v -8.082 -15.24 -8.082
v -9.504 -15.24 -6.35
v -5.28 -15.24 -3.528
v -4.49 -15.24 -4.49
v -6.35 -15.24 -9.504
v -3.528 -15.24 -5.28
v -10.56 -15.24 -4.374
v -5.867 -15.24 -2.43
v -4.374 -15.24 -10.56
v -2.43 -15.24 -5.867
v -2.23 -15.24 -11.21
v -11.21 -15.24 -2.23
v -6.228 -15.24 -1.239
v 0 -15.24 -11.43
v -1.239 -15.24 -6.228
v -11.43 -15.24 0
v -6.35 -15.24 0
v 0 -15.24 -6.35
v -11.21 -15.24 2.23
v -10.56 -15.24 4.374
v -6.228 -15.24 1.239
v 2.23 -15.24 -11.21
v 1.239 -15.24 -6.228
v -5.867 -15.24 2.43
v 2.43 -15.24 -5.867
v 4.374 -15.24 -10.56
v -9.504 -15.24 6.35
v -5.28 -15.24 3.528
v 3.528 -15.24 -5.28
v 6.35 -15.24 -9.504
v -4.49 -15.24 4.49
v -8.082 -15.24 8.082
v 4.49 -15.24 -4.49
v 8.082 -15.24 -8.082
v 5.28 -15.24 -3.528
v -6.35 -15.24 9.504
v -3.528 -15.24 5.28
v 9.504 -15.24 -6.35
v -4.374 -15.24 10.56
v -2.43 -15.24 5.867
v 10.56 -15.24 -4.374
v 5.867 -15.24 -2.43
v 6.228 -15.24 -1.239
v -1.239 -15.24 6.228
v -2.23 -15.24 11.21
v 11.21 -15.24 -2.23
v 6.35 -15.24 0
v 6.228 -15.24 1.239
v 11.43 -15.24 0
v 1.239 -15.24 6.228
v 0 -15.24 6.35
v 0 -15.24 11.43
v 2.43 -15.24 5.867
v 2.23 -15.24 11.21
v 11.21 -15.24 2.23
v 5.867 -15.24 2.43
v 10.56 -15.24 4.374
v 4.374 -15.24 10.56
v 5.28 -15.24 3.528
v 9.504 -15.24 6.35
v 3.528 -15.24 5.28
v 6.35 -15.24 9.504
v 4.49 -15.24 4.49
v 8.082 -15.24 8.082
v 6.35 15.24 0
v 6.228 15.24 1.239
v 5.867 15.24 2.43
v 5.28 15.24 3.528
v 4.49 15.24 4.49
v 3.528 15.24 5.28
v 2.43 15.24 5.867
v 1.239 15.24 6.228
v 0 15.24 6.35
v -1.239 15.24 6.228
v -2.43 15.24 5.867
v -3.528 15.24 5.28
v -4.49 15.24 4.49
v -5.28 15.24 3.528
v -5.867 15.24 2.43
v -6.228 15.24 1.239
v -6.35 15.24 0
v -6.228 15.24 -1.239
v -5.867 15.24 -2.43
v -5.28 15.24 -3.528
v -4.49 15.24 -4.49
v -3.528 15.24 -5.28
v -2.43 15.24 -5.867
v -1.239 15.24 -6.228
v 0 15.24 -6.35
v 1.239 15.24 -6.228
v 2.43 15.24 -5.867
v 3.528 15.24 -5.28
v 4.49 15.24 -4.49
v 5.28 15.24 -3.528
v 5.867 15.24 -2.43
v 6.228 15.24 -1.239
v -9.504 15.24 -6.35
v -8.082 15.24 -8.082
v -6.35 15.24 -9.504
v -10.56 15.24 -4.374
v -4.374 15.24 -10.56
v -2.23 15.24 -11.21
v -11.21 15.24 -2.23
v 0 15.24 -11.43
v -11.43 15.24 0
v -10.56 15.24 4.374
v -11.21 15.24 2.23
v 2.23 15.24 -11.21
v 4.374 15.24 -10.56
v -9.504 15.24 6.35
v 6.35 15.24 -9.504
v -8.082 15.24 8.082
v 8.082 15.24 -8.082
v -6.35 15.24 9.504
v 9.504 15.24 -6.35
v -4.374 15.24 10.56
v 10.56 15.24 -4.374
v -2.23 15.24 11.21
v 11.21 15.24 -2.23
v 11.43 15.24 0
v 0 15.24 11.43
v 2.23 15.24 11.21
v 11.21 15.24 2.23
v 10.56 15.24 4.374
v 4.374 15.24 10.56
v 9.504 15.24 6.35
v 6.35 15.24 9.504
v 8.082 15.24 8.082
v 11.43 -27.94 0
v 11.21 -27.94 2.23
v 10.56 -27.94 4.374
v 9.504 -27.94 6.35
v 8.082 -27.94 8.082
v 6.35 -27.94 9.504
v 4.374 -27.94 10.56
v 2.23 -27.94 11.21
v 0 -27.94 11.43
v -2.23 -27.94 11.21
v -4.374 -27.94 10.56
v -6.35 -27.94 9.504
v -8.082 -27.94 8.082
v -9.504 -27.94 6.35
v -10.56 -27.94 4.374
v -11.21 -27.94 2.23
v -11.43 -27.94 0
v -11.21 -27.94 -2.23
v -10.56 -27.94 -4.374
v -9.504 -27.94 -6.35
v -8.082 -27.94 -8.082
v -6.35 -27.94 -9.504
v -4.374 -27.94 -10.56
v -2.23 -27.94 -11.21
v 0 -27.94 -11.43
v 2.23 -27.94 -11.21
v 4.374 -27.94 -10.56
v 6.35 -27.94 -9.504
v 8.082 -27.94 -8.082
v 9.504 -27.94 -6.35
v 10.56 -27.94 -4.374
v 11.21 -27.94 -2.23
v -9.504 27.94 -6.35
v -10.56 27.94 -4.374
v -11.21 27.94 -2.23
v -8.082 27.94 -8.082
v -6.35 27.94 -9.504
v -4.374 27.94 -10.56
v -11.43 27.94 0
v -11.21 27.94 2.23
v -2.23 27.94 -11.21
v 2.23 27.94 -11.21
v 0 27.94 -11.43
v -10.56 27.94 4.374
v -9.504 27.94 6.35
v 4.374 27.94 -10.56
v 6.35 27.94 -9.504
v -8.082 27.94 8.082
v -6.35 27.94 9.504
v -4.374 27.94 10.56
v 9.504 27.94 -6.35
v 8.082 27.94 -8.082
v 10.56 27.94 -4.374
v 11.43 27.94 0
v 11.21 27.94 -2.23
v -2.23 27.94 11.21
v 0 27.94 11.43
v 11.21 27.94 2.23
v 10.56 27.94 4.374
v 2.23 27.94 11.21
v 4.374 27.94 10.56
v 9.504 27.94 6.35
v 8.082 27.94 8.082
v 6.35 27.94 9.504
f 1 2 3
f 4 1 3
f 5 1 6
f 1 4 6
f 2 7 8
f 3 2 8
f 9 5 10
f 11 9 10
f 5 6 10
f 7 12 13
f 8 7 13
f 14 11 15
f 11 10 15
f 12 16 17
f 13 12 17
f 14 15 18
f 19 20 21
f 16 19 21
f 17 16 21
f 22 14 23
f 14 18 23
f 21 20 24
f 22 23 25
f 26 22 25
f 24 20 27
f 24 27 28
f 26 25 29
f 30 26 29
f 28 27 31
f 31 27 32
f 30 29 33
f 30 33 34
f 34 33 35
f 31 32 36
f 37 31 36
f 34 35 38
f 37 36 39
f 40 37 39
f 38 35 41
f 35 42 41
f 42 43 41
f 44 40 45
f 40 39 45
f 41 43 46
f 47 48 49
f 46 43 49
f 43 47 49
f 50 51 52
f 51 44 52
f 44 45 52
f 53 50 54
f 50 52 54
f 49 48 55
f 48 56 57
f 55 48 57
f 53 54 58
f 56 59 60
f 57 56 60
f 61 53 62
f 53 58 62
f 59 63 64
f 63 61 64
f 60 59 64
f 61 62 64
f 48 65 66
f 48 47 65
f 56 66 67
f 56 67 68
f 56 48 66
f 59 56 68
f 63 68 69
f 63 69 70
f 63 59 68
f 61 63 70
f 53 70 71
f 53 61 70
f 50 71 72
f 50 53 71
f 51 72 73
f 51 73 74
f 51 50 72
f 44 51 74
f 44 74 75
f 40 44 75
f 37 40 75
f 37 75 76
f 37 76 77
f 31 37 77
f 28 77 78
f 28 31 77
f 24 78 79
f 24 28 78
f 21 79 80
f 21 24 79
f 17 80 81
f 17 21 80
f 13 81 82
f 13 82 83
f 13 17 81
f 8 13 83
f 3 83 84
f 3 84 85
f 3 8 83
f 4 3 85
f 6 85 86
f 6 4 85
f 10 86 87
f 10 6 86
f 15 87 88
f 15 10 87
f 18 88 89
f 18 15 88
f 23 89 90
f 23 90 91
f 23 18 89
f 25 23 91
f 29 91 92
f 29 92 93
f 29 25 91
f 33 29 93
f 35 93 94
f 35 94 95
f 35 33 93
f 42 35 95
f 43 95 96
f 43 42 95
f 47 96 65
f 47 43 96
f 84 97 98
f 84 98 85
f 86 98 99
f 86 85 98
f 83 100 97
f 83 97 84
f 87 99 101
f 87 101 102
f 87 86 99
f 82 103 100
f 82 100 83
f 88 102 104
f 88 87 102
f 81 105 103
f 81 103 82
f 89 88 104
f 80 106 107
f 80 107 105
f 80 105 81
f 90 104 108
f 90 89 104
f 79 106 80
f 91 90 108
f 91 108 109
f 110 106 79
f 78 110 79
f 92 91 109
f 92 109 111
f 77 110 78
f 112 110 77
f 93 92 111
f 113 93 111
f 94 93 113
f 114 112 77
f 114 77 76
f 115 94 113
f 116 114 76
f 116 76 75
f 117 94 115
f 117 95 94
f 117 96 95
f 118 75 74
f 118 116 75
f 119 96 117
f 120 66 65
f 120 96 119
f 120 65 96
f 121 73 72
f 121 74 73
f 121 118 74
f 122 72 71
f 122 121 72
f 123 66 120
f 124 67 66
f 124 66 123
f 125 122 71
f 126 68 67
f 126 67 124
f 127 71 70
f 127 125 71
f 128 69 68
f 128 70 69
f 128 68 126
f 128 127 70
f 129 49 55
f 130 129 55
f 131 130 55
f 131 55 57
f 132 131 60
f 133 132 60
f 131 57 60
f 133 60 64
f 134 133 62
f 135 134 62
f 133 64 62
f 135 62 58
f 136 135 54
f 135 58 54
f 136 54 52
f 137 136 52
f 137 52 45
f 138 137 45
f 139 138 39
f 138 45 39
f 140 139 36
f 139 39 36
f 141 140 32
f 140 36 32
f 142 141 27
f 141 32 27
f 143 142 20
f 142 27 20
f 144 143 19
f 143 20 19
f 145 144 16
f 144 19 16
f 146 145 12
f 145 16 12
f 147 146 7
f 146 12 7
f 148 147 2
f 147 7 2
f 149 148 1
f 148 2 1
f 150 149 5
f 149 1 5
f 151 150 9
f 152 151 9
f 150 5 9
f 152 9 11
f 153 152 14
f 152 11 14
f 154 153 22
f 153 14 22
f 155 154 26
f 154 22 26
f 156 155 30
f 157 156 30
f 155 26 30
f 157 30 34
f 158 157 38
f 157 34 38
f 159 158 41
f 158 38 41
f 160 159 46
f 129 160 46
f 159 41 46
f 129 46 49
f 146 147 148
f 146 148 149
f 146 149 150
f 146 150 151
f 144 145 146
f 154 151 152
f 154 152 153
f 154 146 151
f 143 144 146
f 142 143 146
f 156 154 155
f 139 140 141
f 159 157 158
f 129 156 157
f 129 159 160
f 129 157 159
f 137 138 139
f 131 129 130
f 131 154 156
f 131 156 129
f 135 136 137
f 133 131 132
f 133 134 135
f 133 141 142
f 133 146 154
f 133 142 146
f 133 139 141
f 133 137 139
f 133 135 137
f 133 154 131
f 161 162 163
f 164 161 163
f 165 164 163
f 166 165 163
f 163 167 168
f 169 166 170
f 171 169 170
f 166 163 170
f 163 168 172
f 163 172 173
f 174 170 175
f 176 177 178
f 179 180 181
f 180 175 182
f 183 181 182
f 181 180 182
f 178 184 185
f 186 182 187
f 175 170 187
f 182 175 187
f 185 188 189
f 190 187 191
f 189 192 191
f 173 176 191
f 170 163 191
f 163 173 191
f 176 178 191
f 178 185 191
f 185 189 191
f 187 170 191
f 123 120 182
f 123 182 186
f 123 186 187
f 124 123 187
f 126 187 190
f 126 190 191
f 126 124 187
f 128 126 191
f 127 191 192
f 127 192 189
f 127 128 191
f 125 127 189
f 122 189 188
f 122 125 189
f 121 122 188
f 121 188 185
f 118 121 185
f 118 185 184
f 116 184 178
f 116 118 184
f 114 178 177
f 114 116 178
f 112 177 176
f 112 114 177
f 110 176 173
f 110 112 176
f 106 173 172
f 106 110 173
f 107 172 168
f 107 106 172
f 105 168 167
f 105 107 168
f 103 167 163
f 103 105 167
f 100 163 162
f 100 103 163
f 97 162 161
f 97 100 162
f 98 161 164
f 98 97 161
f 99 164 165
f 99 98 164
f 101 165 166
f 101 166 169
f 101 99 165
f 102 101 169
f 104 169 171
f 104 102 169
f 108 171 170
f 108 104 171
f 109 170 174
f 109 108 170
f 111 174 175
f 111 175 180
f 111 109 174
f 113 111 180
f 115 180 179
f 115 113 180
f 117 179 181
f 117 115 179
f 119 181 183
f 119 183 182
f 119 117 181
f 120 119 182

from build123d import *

# Parameters (mm, degrees)
F0_R     = 6.35
F1_DEPTH = 15.24
F2_R     = 11.43
F2_R_2   = 6.35
F3_DEPTH = 12.7


with BuildPart() as f1:
    # F0 (on Front) → F1 (new body)
    with BuildSketch(Plane.XZ):
        Circle(F0_R)
    extrude(amount=F1_DEPTH)

    # F2 (on face) → F3 (join)
    with BuildSketch(Plane.XZ.offset(15.24)):
        Circle(F2_R)
        Circle(F2_R_2, mode=Mode.SUBTRACT)
        Circle(F2_R_2)
    extrude(amount=F3_DEPTH)

    # F4: F1 across plane


with BuildPart() as f1_1:
    add(f1.part)
    add(f1.part.mirror(Plane.XZ))


solid = f1_1.part
